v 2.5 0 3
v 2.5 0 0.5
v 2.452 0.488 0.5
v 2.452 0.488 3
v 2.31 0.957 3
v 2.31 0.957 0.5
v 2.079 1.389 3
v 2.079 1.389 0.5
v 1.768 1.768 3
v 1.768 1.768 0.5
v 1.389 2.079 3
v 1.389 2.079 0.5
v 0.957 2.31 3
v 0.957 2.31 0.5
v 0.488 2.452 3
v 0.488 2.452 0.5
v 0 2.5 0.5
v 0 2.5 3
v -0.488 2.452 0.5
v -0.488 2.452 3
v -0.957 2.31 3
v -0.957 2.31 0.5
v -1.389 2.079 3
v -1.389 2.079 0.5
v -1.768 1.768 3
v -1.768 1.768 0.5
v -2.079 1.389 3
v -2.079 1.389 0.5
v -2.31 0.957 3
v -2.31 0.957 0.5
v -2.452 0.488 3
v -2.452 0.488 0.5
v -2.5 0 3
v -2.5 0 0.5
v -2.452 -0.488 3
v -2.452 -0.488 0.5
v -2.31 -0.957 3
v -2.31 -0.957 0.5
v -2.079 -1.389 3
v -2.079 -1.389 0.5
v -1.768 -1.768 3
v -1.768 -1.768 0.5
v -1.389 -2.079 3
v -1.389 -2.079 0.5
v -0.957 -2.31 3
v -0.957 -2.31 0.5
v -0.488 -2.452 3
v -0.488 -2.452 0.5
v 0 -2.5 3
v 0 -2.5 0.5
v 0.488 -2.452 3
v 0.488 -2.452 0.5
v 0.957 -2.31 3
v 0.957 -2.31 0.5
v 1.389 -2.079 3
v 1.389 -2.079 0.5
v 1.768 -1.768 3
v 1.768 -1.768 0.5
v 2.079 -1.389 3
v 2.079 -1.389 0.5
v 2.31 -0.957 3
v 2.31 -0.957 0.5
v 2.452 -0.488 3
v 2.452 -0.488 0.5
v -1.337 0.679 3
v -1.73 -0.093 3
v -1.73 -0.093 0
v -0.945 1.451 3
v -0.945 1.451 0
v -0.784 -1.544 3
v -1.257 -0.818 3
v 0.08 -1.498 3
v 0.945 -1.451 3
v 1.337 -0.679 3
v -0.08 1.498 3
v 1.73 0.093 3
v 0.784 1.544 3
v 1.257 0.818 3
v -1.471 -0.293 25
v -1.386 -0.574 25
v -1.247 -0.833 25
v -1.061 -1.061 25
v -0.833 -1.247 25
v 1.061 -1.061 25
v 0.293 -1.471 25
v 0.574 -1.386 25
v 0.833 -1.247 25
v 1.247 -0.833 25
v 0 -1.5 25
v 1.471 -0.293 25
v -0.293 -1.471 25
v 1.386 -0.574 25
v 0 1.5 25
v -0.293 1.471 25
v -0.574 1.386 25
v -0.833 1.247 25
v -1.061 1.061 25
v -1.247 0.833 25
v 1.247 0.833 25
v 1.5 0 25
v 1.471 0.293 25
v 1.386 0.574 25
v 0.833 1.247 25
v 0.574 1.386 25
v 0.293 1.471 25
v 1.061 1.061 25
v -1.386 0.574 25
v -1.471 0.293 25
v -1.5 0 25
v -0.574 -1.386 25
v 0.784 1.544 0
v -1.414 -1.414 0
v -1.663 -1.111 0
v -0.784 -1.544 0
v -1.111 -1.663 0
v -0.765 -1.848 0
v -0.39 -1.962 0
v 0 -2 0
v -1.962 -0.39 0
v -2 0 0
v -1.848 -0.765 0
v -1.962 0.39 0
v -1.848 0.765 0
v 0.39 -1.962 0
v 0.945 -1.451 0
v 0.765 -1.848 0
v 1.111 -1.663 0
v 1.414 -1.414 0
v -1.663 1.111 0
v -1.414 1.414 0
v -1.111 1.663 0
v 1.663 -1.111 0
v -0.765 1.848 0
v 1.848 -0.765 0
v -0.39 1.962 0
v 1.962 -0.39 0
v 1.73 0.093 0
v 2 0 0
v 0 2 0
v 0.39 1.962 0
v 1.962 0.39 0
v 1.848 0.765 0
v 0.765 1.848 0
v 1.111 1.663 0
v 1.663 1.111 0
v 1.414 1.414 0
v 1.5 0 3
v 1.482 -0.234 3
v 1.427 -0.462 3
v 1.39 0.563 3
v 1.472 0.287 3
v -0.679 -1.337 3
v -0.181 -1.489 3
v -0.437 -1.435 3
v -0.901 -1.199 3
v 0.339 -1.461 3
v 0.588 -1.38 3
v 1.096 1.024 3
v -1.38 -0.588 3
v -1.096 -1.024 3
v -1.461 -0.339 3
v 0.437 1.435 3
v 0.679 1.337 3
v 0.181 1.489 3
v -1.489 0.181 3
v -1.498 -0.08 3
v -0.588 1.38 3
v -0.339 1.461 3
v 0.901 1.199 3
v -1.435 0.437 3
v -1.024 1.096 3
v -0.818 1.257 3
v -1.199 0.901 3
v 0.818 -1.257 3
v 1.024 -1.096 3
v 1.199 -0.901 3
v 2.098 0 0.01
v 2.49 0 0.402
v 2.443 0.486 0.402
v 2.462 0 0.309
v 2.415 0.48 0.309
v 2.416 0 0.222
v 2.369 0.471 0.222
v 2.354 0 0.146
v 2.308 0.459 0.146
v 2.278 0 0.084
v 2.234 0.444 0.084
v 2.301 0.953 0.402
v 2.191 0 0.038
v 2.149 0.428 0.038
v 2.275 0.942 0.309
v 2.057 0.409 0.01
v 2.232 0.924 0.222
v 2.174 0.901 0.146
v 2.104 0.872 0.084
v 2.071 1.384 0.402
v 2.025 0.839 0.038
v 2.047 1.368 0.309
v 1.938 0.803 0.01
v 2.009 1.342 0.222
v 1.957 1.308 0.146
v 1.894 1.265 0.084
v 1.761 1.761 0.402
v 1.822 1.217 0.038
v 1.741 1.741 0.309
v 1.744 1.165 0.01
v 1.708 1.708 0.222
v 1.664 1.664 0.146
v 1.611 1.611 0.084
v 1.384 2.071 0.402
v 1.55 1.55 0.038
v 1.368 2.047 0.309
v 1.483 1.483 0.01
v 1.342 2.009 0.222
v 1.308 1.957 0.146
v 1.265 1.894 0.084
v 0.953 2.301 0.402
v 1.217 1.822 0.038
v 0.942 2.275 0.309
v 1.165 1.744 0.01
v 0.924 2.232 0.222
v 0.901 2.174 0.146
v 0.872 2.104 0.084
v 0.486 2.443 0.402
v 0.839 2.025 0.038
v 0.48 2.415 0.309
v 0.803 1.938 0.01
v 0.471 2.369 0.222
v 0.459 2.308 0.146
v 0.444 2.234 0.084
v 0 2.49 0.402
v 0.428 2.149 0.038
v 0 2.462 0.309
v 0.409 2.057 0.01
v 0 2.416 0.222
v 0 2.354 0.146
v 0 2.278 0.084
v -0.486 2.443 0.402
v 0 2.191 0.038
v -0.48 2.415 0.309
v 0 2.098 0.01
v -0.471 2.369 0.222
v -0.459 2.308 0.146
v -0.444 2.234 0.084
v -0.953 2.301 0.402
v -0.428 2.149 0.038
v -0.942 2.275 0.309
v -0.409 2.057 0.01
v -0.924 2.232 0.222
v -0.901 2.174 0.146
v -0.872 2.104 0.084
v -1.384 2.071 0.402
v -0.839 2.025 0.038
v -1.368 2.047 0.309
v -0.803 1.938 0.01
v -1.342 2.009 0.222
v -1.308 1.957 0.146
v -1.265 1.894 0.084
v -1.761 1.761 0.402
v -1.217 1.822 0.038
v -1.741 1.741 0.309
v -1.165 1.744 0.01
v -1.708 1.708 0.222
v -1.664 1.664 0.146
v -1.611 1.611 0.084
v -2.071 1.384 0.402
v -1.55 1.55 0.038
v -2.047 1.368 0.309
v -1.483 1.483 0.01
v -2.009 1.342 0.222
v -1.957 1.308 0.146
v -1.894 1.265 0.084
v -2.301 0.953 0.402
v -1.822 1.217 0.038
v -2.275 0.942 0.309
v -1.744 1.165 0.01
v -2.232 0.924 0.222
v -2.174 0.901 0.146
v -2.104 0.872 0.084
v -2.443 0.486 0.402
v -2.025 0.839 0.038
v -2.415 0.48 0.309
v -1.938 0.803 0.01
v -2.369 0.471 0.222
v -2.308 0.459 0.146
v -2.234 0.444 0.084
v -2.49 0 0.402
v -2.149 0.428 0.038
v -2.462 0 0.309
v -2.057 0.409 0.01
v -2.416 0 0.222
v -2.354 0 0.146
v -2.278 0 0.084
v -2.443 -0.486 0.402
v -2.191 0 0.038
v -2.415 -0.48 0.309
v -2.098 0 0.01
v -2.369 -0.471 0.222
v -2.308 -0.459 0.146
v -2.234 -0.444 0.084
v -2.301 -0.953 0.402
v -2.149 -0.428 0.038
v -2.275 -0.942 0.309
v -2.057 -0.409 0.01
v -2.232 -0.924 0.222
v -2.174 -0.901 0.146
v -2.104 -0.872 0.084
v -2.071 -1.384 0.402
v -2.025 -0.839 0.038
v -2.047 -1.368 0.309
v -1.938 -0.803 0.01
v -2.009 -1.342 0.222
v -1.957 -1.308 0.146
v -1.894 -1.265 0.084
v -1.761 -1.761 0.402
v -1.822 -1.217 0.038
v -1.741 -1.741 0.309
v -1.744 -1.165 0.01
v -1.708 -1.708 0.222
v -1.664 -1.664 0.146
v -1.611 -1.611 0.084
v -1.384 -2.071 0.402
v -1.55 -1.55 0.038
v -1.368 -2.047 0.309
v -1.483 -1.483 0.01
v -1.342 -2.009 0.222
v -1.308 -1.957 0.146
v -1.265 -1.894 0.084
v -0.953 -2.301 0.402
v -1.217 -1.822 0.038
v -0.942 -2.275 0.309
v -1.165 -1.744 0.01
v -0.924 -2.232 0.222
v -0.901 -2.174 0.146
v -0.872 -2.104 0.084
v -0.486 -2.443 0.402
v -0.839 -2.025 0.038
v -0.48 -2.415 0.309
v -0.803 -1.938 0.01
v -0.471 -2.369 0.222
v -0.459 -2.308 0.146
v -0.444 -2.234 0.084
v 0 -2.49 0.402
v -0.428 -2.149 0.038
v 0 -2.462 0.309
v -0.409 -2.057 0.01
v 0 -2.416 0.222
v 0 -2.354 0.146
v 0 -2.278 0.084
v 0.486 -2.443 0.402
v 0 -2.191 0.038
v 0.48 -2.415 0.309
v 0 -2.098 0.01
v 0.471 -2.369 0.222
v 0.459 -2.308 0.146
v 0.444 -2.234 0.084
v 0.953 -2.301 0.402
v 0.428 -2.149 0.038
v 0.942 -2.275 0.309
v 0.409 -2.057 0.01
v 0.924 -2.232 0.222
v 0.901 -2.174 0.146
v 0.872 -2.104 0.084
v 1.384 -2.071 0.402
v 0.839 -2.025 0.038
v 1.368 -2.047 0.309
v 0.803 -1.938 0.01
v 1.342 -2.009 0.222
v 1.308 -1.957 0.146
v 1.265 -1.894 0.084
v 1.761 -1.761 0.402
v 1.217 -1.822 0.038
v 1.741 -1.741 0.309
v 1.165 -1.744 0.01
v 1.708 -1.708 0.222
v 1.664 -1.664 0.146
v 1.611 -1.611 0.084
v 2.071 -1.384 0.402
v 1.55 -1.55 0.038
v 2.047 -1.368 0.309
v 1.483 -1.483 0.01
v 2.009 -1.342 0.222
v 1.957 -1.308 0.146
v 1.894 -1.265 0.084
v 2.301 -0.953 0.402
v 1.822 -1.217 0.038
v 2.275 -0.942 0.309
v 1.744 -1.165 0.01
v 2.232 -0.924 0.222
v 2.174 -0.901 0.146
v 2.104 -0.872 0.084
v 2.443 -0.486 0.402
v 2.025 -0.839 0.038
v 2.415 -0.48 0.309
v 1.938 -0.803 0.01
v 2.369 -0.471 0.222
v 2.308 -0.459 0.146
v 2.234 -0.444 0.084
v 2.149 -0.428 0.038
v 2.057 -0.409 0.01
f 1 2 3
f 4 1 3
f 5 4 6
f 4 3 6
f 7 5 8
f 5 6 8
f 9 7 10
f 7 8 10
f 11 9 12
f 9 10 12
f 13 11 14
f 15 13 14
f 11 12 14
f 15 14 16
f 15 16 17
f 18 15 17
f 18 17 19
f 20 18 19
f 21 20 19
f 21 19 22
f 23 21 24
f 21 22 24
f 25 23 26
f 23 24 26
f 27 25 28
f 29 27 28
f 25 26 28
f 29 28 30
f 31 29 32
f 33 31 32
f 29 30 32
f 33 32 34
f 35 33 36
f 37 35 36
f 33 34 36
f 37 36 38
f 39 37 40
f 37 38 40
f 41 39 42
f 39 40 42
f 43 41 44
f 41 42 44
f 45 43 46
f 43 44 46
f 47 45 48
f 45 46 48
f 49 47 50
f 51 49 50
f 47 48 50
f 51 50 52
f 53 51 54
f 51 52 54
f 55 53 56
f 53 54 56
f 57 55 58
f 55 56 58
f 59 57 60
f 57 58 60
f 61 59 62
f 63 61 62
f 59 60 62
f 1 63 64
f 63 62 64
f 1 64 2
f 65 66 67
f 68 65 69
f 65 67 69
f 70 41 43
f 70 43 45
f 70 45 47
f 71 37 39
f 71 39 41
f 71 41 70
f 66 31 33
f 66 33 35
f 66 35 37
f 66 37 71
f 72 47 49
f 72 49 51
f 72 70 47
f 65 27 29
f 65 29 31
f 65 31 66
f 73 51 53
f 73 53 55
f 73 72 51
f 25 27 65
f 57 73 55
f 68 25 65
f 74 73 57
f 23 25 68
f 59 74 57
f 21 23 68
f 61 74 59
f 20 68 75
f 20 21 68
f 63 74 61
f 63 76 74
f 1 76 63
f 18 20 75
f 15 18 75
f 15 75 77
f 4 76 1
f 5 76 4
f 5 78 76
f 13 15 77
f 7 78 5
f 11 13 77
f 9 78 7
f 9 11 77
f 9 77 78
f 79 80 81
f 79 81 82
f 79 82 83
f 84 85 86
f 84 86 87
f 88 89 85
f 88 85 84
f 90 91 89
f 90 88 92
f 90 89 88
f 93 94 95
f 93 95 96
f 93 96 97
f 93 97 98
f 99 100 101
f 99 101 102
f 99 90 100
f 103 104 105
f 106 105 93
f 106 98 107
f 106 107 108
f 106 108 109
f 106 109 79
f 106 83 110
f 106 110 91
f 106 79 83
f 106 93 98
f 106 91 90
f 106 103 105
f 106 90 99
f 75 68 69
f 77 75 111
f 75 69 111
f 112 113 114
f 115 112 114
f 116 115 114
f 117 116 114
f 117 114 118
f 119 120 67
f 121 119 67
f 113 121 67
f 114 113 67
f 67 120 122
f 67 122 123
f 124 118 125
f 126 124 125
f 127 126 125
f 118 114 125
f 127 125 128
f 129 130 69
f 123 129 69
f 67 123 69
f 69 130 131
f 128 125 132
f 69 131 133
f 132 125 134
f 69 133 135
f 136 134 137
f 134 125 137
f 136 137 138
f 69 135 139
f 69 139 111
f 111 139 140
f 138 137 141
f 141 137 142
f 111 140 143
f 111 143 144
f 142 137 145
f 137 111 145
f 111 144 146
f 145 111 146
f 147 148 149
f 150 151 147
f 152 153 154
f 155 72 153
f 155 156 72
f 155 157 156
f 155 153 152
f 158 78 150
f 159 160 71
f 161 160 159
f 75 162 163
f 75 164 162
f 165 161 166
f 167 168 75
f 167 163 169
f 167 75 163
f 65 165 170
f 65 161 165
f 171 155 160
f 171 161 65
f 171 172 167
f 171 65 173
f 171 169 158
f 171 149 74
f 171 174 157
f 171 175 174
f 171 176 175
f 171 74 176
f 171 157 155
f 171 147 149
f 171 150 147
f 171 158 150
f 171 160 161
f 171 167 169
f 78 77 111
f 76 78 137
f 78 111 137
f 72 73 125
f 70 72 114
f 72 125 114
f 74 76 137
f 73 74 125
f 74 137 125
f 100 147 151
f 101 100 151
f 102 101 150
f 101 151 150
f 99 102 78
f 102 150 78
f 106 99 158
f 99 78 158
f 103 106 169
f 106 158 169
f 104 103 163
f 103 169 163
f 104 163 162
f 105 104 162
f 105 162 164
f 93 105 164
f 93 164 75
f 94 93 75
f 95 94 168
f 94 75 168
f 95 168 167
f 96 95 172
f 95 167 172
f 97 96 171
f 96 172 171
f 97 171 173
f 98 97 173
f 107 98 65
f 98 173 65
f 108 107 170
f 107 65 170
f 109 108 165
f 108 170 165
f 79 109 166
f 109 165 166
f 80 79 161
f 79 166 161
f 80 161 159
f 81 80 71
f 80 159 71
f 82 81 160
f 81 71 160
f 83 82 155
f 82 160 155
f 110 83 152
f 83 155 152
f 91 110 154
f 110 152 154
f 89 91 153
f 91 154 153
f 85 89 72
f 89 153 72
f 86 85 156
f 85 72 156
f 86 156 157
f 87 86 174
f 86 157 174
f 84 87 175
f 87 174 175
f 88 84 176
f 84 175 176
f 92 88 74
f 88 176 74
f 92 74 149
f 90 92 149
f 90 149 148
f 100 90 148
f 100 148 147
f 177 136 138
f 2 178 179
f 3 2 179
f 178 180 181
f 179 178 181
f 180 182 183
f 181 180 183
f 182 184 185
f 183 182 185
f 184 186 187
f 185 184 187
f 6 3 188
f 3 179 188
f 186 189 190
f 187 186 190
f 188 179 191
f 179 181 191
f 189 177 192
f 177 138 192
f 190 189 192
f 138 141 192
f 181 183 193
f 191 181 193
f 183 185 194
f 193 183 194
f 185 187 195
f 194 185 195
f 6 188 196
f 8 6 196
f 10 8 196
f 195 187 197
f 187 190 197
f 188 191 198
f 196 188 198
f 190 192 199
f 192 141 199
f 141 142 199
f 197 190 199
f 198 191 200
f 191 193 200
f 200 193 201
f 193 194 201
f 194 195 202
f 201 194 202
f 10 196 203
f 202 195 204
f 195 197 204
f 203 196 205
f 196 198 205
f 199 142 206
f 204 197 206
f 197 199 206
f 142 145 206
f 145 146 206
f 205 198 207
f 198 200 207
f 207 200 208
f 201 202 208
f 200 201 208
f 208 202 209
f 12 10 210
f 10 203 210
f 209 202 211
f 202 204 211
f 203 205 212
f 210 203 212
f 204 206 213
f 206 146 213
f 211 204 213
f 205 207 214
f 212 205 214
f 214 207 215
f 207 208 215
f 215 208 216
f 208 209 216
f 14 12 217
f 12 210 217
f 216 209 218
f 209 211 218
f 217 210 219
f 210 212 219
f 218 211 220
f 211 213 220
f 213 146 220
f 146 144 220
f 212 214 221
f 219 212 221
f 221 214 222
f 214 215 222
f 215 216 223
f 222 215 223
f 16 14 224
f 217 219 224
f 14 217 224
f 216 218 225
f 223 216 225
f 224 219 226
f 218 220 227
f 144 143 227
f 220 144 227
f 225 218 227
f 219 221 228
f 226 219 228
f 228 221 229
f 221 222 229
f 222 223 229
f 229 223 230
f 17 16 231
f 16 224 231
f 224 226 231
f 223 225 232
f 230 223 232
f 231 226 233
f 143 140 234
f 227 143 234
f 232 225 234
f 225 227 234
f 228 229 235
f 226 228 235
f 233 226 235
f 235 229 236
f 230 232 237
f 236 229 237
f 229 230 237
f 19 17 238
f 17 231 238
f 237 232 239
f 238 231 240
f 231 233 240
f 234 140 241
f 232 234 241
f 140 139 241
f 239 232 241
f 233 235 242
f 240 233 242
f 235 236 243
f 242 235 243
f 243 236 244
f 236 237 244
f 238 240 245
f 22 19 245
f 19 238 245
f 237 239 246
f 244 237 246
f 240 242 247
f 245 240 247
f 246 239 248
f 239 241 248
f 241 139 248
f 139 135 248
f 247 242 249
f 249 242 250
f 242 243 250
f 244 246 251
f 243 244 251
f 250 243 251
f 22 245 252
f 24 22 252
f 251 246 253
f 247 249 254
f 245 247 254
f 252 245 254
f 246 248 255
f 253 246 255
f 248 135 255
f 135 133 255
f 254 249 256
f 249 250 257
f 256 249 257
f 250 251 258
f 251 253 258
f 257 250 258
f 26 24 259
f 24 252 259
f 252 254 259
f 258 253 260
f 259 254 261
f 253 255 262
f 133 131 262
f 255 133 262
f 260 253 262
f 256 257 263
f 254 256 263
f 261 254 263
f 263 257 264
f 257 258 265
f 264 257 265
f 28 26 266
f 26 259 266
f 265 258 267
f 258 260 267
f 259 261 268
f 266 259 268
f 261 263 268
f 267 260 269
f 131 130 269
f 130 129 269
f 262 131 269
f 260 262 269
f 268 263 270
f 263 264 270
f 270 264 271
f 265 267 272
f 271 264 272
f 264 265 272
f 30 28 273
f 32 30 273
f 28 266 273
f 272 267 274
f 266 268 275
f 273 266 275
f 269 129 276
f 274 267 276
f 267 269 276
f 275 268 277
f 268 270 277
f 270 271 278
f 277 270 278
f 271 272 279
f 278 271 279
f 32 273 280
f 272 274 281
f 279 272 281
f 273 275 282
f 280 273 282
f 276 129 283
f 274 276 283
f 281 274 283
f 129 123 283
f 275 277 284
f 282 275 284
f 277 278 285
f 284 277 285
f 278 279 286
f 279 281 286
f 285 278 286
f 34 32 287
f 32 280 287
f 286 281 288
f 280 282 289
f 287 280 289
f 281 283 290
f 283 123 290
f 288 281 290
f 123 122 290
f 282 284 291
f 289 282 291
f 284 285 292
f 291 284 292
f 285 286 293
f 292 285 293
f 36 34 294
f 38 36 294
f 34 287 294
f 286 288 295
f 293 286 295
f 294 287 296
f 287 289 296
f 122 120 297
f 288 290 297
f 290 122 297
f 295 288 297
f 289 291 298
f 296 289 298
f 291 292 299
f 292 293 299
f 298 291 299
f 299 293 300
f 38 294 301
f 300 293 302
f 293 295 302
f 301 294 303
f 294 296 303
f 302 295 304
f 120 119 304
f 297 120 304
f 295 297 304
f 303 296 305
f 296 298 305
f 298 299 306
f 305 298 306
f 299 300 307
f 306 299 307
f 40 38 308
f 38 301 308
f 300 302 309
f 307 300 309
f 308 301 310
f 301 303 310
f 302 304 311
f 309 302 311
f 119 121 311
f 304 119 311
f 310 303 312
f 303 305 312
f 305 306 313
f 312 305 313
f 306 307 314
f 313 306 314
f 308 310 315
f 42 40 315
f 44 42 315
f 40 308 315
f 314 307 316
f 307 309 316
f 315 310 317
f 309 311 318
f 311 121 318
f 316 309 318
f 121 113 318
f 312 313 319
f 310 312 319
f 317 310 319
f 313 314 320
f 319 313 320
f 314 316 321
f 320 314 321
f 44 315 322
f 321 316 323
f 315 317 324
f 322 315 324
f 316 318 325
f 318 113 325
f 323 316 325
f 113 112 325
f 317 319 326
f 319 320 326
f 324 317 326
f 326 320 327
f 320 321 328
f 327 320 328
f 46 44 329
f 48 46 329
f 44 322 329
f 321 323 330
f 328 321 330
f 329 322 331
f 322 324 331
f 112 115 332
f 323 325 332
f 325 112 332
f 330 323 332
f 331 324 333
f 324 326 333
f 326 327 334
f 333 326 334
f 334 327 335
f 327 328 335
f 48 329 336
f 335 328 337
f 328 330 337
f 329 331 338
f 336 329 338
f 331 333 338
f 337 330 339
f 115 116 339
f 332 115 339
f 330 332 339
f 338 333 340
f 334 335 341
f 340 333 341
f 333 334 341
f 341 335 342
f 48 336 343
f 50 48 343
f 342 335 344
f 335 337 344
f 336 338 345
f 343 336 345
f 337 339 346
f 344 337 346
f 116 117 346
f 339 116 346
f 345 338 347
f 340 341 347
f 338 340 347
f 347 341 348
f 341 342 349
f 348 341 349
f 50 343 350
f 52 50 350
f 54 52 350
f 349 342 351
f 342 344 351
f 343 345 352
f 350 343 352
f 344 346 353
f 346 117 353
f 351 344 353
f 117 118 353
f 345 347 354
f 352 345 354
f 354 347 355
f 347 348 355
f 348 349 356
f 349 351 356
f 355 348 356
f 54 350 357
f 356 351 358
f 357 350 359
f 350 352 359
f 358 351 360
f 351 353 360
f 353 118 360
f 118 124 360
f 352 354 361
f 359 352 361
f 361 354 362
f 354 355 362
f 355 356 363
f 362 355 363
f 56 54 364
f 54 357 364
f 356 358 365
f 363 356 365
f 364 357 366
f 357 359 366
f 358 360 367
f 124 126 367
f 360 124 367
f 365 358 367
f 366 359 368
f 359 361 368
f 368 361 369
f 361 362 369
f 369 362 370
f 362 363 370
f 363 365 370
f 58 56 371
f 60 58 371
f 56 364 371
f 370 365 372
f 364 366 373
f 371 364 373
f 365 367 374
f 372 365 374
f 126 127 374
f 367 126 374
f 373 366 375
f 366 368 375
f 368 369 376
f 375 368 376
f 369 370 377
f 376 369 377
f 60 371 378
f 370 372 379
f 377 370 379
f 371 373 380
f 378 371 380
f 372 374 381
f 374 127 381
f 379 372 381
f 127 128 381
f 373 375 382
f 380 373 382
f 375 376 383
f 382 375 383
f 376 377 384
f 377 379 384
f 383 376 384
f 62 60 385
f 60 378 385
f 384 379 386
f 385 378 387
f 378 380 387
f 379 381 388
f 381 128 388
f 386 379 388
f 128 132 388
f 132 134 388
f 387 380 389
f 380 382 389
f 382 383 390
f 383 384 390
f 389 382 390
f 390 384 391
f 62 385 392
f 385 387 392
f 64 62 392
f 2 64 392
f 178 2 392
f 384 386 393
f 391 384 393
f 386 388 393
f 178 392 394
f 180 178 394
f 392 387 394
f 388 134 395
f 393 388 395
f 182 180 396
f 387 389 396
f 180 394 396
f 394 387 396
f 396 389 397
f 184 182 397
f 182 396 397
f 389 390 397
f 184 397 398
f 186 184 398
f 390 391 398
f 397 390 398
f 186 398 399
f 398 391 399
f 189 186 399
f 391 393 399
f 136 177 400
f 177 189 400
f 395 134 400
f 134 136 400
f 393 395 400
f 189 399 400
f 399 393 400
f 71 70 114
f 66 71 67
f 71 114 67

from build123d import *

# Parameters (mm, degrees)
SKETCH1_R           = 2.5
BOSS_EXTRUDE1_DEPTH = 3
SKETCH2_R           = 1.5
BOSS_EXTRUDE2_DEPTH = 22
CUT_EXTRUDE1_DEPTH  = 3
FILLET1_R           = 0.5


with BuildPart() as part:
    # Sketch1 → Boss-Extrude1 (new body)
    with BuildSketch(Plane.XY):
        Circle(SKETCH1_R)
    extrude(amount=BOSS_EXTRUDE1_DEPTH)

    # Sketch2 → Boss-Extrude2 (add)
    with BuildSketch(Plane.XY.offset(3)):
        Circle(SKETCH2_R)
    extrude(amount=BOSS_EXTRUDE2_DEPTH)

    # Sketch3 → Cut-Extrude1 (cut)
    with BuildSketch(Plane(origin=(0, 0, 0), x_dir=(-1, 0, 0), z_dir=(0, 0, -1))):
        Polygon((0.784462107, -1.544221229), (1.729565866, -0.092746502), (0.94510376, 1.451474727), (-0.784462107, 1.544221229), (-1.729565866, 0.092746502), (-0.94510376, -1.451474727), align=None)
    extrude(amount=-CUT_EXTRUDE1_DEPTH, mode=Mode.SUBTRACT)

    # Fillet1
    fillet1_edges = [part.edges().sort_by_distance(p)[0] for p in [
        (-2.5, 0, 0),
    ]]
    fillet(fillet1_edges, radius=FILLET1_R)


solid = part.part
